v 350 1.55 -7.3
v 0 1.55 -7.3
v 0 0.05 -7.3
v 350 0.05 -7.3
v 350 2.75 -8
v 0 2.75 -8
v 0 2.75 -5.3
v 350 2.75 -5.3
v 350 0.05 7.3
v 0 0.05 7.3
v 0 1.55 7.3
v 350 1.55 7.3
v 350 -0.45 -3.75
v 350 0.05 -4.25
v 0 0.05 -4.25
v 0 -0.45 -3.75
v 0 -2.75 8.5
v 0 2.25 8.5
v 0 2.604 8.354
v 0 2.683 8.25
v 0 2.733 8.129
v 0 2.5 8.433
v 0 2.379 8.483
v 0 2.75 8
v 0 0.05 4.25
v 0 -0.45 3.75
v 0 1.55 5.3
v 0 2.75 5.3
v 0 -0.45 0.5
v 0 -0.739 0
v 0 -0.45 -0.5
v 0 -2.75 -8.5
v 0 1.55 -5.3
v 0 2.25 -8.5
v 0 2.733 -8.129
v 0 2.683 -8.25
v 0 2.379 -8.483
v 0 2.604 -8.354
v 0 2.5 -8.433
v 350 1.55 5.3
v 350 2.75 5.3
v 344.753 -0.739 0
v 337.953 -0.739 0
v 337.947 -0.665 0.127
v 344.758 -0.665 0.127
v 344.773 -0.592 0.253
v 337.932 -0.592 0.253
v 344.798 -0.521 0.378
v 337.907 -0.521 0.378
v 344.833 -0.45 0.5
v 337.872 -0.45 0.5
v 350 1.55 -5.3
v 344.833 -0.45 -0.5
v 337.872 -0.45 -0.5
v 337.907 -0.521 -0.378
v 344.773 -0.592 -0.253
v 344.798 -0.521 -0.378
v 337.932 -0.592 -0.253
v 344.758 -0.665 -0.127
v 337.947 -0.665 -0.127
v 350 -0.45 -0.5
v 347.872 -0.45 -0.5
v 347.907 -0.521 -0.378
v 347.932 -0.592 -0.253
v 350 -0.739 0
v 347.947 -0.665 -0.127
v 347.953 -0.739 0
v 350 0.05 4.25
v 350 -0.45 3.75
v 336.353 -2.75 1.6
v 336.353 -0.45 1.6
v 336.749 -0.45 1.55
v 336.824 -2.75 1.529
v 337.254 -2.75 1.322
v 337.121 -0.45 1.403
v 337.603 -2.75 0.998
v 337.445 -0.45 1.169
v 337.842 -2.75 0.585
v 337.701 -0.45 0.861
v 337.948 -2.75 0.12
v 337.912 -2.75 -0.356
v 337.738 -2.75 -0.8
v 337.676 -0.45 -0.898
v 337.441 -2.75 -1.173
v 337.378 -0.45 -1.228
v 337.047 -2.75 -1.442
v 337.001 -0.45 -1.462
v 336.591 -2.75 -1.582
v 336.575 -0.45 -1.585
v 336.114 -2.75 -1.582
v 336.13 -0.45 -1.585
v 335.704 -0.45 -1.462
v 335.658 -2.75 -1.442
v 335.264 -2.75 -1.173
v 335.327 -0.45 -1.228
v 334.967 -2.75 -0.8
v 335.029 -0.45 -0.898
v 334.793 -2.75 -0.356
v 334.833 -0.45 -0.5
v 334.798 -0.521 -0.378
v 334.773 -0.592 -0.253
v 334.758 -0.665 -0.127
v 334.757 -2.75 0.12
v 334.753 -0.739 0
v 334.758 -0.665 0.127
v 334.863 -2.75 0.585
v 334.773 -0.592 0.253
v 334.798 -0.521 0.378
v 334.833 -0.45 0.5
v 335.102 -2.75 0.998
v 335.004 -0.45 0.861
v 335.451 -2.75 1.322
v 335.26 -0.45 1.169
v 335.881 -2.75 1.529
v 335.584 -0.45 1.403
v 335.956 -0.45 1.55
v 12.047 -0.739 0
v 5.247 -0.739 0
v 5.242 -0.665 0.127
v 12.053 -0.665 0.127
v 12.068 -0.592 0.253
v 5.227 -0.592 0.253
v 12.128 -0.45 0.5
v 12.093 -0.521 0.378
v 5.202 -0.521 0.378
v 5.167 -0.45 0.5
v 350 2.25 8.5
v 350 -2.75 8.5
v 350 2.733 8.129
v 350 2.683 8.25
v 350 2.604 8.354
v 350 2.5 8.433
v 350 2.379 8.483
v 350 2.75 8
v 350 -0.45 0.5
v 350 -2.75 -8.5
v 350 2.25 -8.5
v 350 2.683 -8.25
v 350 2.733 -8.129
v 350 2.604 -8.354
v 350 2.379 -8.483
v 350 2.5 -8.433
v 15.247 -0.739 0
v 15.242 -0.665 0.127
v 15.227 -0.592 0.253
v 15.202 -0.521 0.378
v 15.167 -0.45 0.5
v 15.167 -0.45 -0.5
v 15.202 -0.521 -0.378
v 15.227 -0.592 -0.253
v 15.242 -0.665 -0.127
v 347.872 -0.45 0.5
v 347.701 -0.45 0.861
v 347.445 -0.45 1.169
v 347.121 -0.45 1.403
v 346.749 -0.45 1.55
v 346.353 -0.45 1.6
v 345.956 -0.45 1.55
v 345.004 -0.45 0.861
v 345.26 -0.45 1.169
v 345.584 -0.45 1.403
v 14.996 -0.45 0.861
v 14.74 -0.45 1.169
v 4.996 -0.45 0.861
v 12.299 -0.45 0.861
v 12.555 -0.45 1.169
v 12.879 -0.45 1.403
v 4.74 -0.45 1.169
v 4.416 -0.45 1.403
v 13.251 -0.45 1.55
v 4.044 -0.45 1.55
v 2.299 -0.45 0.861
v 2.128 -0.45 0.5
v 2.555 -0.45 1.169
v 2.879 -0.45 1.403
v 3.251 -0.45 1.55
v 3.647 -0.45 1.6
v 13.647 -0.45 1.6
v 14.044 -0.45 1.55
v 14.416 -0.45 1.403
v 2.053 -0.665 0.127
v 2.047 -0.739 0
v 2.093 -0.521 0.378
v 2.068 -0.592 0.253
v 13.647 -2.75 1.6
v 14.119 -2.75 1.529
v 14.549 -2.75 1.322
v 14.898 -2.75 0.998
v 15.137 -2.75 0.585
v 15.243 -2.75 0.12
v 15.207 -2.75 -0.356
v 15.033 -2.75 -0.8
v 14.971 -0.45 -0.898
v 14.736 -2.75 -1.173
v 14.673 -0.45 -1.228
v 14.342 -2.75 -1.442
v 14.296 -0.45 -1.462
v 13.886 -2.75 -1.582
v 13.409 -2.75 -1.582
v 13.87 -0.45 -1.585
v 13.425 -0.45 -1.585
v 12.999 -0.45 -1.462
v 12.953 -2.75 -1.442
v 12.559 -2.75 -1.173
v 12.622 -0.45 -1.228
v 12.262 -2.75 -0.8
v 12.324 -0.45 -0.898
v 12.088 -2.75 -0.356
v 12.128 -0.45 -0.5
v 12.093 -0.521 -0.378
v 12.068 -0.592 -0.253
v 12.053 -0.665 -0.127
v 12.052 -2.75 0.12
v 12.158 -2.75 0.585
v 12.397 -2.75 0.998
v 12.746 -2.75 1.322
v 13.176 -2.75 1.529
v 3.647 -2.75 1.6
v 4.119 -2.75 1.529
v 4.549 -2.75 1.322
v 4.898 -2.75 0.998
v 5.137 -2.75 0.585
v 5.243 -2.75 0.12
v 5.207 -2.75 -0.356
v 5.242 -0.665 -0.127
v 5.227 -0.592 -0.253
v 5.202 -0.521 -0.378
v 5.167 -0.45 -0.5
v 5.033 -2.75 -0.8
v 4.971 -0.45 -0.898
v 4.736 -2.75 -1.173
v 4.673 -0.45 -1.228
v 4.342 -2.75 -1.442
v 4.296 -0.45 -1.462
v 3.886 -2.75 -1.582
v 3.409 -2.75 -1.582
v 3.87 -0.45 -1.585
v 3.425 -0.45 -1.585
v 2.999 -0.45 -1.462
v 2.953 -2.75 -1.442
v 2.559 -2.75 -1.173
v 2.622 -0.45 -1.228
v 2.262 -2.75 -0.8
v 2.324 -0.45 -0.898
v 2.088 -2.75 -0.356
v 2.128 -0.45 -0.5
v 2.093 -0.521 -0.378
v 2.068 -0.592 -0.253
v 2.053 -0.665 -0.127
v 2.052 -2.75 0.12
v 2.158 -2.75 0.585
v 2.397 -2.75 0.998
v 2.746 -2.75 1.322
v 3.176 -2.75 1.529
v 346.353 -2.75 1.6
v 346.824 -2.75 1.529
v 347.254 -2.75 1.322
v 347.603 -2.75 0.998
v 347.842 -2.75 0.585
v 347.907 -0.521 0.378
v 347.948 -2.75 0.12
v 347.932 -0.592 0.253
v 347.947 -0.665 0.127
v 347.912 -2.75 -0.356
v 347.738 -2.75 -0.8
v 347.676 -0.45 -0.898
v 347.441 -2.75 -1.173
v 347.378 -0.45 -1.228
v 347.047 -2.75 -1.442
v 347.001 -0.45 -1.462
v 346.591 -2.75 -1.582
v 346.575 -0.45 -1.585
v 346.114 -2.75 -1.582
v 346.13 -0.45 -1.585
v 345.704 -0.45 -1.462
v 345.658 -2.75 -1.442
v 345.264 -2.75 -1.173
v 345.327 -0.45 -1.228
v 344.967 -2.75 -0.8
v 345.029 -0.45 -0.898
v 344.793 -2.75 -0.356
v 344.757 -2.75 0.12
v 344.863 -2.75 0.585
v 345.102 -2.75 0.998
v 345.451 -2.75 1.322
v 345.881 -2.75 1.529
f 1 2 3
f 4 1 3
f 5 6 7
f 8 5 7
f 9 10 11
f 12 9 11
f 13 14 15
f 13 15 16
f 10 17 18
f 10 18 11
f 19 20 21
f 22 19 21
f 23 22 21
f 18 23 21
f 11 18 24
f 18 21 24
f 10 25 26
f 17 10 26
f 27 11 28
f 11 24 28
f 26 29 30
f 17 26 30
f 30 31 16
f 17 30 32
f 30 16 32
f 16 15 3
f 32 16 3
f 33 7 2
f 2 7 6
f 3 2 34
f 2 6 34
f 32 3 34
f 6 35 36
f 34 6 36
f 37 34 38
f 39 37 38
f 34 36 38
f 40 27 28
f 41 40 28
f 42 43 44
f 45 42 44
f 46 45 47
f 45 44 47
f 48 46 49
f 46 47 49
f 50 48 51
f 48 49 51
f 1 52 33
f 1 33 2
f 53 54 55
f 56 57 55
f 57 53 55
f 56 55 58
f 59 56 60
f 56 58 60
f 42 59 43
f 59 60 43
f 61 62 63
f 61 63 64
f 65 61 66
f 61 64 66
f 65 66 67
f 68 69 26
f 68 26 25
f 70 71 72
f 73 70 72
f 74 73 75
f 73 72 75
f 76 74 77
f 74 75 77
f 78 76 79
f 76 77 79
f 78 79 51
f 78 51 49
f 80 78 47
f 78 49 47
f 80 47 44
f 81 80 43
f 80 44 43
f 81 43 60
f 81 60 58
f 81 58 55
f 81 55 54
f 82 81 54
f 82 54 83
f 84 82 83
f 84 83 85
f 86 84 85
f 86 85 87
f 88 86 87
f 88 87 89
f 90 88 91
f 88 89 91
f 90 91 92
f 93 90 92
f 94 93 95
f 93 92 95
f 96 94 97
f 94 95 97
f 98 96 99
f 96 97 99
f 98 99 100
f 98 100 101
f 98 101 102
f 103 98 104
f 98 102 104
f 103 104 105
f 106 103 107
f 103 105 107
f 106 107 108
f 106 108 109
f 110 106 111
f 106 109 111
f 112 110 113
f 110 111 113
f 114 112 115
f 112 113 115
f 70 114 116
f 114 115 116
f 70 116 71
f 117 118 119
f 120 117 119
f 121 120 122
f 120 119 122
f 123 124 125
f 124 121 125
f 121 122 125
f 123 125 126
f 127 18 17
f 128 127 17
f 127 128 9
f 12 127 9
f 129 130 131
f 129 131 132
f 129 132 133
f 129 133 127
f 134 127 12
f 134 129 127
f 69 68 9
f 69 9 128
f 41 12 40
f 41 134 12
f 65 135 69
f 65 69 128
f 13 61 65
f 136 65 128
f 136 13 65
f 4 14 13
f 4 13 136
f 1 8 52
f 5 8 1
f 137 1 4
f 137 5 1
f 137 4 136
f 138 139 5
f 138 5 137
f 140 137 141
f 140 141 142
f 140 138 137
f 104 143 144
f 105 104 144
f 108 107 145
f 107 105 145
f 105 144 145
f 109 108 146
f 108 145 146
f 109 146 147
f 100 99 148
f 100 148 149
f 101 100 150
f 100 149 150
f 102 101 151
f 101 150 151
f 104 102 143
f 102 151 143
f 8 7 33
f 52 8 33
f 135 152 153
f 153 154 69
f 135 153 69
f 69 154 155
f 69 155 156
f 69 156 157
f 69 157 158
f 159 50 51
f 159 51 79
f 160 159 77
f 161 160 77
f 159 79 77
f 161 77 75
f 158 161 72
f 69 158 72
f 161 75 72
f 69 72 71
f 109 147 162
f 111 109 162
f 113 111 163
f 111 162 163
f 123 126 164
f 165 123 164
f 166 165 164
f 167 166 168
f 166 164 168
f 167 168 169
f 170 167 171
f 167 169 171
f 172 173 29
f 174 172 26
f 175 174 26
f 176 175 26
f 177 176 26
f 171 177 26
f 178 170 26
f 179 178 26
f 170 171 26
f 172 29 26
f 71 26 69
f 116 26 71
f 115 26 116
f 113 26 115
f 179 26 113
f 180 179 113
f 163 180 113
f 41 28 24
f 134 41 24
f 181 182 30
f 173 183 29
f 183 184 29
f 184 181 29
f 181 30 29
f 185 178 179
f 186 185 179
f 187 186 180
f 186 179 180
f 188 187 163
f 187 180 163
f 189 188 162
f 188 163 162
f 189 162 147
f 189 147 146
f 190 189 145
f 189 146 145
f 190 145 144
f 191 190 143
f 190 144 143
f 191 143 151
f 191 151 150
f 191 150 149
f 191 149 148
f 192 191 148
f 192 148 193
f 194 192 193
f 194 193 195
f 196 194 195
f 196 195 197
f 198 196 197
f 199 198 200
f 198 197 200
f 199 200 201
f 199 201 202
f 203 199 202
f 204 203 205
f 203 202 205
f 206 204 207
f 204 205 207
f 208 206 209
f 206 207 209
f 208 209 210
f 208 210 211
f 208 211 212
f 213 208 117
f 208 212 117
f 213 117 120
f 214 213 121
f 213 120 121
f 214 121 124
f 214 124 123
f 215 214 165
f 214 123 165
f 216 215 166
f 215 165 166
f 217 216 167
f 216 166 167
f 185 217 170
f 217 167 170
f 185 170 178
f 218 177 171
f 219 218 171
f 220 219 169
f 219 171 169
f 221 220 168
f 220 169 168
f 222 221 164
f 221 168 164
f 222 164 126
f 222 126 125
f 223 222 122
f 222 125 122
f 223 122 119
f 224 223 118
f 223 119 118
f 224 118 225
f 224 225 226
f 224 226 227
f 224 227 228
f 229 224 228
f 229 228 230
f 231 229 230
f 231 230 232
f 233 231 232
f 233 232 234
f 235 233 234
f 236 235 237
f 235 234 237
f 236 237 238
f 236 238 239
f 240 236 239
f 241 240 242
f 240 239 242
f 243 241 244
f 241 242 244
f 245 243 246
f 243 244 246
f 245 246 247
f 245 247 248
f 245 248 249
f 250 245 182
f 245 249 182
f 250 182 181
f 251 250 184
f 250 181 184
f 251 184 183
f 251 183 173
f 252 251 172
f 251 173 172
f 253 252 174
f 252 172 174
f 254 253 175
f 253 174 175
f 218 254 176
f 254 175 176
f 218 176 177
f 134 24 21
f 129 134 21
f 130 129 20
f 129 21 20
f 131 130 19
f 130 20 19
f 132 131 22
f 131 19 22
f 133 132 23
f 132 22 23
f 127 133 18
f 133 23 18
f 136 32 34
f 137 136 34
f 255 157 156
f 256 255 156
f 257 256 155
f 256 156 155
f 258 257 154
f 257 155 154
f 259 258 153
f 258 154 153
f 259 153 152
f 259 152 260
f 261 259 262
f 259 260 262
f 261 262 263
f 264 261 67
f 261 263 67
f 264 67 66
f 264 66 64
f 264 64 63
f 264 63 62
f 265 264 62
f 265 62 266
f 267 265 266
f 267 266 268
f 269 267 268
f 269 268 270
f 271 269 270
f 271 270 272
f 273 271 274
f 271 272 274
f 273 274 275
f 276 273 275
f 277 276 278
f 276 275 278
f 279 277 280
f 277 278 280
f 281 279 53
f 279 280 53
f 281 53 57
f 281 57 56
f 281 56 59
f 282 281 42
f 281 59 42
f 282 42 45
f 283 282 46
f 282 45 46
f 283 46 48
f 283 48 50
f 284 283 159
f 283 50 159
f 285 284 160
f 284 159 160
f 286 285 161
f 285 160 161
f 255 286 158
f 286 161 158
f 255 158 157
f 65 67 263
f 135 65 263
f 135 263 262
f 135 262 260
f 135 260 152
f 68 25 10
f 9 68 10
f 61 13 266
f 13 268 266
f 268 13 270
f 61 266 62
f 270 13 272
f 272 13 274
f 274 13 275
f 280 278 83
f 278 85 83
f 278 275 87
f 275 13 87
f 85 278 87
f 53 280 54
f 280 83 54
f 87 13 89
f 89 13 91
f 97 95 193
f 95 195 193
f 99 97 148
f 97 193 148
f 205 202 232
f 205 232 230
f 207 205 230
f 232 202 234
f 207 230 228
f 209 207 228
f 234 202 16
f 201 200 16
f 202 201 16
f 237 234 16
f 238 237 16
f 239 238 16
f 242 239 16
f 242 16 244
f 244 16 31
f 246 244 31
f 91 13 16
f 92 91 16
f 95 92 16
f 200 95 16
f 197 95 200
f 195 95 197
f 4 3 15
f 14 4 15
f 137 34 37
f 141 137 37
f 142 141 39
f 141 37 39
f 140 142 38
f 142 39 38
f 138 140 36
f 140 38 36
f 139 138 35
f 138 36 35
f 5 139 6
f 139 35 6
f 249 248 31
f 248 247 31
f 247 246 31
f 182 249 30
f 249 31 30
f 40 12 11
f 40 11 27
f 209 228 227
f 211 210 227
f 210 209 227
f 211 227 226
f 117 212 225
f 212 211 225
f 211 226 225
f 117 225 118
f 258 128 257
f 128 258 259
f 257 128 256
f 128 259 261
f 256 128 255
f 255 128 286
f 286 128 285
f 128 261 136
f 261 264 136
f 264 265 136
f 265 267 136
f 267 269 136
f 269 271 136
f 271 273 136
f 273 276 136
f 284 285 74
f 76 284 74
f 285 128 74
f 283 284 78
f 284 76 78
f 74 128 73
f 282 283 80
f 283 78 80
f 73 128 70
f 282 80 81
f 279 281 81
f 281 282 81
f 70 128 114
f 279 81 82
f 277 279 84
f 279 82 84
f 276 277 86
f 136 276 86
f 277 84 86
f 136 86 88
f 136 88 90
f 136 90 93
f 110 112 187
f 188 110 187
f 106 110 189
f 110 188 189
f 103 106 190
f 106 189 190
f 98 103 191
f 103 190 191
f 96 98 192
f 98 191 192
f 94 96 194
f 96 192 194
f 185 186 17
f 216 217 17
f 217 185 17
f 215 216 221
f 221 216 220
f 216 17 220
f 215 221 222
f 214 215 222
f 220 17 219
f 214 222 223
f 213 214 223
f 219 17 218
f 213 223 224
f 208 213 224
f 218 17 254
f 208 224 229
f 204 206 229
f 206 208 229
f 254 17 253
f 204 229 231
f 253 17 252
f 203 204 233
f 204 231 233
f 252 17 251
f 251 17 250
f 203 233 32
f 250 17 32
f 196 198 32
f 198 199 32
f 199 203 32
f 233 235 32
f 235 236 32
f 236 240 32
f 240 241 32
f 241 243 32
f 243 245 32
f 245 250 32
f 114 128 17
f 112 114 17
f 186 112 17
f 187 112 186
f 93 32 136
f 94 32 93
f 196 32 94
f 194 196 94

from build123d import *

# Parameters (mm, degrees)
BOSS_EXTRUDE1_DEPTH = 350
SKETCH6_R           = 1.6
CUT_EXTRUDE1_DEPTH  = 351.117823025


with BuildPart() as part:
    # Sketch5 → Boss-Extrude1 (new body)
    with BuildSketch(Plane(origin=(0, 0, 0), x_dir=(0, 0, -1), z_dir=(1, 0, 0))):
        with BuildLine():
            Line((-8.499999996, -2.75), (8.499999996, -2.75))
            Line((8.499999996, -2.75), (8.499999996, 2.25))
            ThreePointArc((8.499999996, 2.25), (8.353553387, 2.603553391), (7.999999996, 2.75))
            Line((7.999999996, 2.75), (5.299999996, 2.75))
            Line((5.299999996, 2.75), (5.299999996, 1.55))
            Line((5.299999996, 1.55), (7.299999998, 1.55))
            Line((7.299999998, 1.55), (7.299999998, 0.05))
            Line((7.299999998, 0.05), (4.249999998, 0.05))
            Line((4.249999998, 0.05), (3.749999998, -0.45))
            Line((3.749999998, -0.45), (0.499999998, -0.45))
            Line((0.499999998, -0.45), (0, -0.738675133))
            Line((0, -0.738675133), (-0.499999998, -0.45))
            Line((-0.499999998, -0.45), (-3.749999998, -0.45))
            Line((-3.749999998, -0.45), (-4.249999998, 0.05))
            Line((-4.249999998, 0.05), (-7.299999998, 0.05))
            Line((-7.299999998, 0.05), (-7.299999998, 1.55))
            Line((-7.299999998, 1.55), (-5.299999996, 1.55))
            Line((-5.299999996, 1.55), (-5.299999996, 2.75))
            Line((-5.299999996, 2.75), (-7.999999996, 2.75))
            ThreePointArc((-7.999999996, 2.75), (-8.353553387, 2.603553391), (-8.499999996, 2.25))
            Line((-8.499999996, 2.25), (-8.499999996, -2.75))
        make_face()
    extrude(amount=BOSS_EXTRUDE1_DEPTH)

    # Sketch6 → Cut-Extrude1 (cut, through all)
    with BuildSketch(Plane(origin=(0, -0.45, 0), x_dir=(1, 0, 0), z_dir=(0, 1, 0))):
        with Locations(Location((13.647499996, 4e-09, 0), (0, 0, 270))):
            Circle(SKETCH6_R)
        with Locations(Location((3.647499996, 4e-09, 0), (0, 0, 270))):
            Circle(SKETCH6_R)
        with Locations(Location((346.352500004, 4e-09, 0), (0, 0, 270))):
            Circle(SKETCH6_R)
        with Locations(Location((336.352500004, 4e-09, 0), (0, 0, 270))):
            Circle(SKETCH6_R)
    extrude(amount=-CUT_EXTRUDE1_DEPTH, mode=Mode.SUBTRACT)


solid = part.part
